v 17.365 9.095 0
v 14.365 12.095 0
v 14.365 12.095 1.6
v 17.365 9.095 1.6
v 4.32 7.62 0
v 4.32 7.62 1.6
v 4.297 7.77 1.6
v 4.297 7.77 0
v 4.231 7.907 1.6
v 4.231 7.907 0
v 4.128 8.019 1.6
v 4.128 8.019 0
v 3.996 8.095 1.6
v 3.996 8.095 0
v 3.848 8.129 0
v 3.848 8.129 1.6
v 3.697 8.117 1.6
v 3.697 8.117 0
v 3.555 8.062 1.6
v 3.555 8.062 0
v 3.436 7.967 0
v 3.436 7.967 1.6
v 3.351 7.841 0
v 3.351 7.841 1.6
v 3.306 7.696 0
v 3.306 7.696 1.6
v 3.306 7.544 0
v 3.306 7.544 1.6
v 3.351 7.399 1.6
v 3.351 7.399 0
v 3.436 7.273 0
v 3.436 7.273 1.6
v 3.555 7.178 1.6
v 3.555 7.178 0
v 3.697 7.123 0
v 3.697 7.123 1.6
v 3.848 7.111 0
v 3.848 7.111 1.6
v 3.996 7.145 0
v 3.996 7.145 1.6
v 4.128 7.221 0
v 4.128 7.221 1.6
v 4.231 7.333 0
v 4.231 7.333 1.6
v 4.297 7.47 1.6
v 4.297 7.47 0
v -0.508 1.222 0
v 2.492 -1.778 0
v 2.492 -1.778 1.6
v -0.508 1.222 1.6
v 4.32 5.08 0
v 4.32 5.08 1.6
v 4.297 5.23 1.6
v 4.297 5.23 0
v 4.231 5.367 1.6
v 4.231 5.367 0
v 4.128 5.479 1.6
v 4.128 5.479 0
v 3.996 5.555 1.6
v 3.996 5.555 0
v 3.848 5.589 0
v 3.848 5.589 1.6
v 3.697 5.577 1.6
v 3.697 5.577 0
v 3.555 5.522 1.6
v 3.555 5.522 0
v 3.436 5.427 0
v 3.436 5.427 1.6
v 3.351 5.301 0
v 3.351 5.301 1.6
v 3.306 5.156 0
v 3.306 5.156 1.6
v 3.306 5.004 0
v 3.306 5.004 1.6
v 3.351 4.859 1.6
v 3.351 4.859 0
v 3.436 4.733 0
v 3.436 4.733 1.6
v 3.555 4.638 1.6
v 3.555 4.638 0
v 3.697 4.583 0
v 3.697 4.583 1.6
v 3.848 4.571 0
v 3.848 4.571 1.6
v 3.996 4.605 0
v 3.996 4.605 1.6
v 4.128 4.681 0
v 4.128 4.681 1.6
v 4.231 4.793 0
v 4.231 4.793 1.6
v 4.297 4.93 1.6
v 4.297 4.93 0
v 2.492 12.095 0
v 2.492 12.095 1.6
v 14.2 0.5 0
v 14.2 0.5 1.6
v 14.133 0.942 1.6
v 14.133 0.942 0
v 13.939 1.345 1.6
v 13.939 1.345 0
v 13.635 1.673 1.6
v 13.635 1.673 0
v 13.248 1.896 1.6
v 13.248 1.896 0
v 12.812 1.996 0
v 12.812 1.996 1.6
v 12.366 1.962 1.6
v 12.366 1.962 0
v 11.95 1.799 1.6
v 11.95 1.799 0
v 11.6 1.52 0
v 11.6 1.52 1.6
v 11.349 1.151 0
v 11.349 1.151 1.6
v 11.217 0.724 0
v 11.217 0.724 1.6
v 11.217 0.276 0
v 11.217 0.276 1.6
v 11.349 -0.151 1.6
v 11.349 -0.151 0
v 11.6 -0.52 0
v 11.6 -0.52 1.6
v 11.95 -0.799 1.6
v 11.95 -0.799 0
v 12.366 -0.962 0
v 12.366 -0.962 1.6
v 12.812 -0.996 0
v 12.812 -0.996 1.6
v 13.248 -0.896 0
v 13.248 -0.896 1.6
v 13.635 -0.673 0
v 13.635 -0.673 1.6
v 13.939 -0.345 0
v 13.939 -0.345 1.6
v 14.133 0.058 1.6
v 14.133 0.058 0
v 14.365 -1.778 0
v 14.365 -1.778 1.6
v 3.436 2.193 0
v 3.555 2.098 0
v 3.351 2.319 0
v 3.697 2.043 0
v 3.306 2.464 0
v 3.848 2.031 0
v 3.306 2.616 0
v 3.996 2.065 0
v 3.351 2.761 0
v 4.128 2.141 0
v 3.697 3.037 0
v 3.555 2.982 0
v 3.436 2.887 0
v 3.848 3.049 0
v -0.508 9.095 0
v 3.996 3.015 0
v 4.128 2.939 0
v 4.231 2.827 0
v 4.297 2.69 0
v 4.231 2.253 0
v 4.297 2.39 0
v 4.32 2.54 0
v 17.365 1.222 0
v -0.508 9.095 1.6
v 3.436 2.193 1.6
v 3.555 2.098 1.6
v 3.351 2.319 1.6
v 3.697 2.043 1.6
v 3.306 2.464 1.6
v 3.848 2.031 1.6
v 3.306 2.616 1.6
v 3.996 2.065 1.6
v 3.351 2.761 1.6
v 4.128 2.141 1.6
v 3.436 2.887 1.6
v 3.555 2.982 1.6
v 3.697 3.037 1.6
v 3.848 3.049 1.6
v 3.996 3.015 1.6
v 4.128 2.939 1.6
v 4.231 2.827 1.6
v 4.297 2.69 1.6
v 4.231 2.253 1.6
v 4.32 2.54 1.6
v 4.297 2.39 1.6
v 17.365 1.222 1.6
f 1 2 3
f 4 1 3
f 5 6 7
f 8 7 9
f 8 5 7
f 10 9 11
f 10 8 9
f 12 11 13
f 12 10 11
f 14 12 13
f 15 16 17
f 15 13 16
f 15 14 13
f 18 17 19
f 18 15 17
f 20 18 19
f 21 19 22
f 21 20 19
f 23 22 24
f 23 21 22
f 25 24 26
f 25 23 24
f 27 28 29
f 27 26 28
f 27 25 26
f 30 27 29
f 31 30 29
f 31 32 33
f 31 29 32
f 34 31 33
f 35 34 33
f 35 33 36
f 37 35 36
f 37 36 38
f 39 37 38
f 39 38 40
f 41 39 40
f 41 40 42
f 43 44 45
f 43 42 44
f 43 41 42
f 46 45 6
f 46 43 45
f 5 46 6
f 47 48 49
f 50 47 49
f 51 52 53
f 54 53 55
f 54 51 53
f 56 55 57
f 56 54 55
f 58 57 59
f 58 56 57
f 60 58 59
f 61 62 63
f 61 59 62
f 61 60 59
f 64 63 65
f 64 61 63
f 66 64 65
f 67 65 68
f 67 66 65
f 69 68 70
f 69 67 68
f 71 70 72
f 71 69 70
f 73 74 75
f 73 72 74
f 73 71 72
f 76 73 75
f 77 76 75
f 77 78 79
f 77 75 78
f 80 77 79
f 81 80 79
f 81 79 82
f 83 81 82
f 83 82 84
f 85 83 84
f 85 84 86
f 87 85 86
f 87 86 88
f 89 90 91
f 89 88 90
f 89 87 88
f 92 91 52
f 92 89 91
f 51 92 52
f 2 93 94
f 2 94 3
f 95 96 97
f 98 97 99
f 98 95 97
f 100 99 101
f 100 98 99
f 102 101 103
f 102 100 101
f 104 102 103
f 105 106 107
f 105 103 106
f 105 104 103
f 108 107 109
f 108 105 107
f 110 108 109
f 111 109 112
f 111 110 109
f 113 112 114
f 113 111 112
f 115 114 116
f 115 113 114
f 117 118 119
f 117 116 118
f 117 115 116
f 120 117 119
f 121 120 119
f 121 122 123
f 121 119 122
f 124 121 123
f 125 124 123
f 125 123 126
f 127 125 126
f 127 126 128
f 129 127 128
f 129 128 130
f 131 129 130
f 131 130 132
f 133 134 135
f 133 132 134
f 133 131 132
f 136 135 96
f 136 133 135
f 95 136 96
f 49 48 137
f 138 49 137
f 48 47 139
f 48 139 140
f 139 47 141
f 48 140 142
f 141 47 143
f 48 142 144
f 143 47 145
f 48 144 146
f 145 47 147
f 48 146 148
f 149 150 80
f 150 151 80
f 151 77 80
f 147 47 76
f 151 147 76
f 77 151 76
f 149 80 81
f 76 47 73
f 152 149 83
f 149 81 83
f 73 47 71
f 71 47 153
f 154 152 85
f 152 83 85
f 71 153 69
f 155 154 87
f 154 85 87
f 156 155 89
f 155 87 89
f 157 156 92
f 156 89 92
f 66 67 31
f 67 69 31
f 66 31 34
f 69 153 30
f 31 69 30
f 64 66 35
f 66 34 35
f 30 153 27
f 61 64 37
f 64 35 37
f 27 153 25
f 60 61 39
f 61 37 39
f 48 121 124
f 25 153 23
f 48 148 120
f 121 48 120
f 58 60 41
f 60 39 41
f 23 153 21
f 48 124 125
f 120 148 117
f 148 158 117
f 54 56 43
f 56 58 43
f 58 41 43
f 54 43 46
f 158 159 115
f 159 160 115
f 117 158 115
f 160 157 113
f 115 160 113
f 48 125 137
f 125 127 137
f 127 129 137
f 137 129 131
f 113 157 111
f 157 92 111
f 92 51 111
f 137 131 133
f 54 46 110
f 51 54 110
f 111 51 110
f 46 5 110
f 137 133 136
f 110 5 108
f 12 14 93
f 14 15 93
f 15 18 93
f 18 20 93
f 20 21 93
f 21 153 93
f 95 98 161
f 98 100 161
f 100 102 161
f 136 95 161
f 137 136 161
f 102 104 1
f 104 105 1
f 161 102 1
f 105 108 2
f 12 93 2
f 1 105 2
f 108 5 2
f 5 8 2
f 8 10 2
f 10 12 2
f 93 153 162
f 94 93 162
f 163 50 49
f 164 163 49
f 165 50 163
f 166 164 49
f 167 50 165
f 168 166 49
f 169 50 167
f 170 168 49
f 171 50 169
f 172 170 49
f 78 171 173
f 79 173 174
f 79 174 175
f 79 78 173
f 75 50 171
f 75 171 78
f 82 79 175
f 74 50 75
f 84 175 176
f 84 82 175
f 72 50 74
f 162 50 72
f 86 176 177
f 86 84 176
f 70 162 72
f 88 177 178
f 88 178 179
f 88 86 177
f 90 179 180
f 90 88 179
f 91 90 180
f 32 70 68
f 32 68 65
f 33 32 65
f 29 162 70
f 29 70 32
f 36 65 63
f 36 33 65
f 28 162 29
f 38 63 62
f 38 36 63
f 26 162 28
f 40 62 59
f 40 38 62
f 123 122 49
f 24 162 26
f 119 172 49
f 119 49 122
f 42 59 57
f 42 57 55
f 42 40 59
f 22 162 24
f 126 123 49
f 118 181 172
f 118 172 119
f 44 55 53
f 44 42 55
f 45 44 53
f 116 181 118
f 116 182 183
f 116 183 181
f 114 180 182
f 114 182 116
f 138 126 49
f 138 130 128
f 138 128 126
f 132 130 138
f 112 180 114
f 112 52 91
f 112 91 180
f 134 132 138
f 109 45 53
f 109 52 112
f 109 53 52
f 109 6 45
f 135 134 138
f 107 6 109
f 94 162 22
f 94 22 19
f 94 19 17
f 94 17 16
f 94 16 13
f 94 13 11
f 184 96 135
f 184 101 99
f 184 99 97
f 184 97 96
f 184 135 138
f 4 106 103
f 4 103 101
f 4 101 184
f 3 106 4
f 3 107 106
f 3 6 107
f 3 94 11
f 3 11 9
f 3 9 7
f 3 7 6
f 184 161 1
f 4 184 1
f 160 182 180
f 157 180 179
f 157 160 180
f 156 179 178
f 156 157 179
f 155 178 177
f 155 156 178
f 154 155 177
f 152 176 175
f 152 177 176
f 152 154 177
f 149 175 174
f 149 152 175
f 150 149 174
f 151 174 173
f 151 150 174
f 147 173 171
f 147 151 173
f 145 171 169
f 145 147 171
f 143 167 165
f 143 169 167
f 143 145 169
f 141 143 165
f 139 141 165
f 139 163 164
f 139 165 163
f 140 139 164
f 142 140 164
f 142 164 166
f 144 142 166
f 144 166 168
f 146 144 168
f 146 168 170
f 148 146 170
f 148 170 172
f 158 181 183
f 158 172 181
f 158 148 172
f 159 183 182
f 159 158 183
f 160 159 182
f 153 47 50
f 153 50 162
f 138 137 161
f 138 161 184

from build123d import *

# Parameters (mm, degrees)
ESQUISSE1_W         = 17.873
ESQUISSE1_H         = 13.873
BOARD_OUTLINE_DEPTH = 1.6
ESQUISSE2_R         = 1.5
NPTH_DEPTH          = 2.6
ESQUISSE3_R         = 0.51
PTH_DEPTH           = 2.6
CHANFREIN1_SIZE     = 3


with BuildPart() as part:
    # Esquisse1 → Board_Outline (new body)
    with BuildSketch(Plane.XY):
        with Locations((8.4285, 5.1585)):
            Rectangle(ESQUISSE1_W, ESQUISSE1_H)
    extrude(amount=BOARD_OUTLINE_DEPTH)

    # Esquisse2 → NPTH (cut, through all)
    with BuildSketch(Plane.XY):
        with Locations((12.7, 0.5)):
            Circle(ESQUISSE2_R)
    extrude(amount=NPTH_DEPTH, mode=Mode.SUBTRACT)

    # Esquisse3 → PTH (cut, through all)
    with BuildSketch(Plane.XY):
        with Locations((3.81, 2.54)):
            Circle(ESQUISSE3_R)
        with Locations((3.81, 5.08)):
            Circle(ESQUISSE3_R)
        with Locations((3.81, 7.62)):
            Circle(ESQUISSE3_R)
    extrude(amount=PTH_DEPTH, mode=Mode.SUBTRACT)

    # Chanfrein1
    chanfrein1_edges = [part.edges().sort_by_distance(p)[0] for p in [
        (-0.508, -1.778, 0.8),
        (-0.508, 12.095, 0.8),
        (17.365, 12.095, 0.8),
        (17.365, -1.778, 0.8),
    ]]
    chamfer(chanfrein1_edges, length=CHANFREIN1_SIZE)


solid = part.part
